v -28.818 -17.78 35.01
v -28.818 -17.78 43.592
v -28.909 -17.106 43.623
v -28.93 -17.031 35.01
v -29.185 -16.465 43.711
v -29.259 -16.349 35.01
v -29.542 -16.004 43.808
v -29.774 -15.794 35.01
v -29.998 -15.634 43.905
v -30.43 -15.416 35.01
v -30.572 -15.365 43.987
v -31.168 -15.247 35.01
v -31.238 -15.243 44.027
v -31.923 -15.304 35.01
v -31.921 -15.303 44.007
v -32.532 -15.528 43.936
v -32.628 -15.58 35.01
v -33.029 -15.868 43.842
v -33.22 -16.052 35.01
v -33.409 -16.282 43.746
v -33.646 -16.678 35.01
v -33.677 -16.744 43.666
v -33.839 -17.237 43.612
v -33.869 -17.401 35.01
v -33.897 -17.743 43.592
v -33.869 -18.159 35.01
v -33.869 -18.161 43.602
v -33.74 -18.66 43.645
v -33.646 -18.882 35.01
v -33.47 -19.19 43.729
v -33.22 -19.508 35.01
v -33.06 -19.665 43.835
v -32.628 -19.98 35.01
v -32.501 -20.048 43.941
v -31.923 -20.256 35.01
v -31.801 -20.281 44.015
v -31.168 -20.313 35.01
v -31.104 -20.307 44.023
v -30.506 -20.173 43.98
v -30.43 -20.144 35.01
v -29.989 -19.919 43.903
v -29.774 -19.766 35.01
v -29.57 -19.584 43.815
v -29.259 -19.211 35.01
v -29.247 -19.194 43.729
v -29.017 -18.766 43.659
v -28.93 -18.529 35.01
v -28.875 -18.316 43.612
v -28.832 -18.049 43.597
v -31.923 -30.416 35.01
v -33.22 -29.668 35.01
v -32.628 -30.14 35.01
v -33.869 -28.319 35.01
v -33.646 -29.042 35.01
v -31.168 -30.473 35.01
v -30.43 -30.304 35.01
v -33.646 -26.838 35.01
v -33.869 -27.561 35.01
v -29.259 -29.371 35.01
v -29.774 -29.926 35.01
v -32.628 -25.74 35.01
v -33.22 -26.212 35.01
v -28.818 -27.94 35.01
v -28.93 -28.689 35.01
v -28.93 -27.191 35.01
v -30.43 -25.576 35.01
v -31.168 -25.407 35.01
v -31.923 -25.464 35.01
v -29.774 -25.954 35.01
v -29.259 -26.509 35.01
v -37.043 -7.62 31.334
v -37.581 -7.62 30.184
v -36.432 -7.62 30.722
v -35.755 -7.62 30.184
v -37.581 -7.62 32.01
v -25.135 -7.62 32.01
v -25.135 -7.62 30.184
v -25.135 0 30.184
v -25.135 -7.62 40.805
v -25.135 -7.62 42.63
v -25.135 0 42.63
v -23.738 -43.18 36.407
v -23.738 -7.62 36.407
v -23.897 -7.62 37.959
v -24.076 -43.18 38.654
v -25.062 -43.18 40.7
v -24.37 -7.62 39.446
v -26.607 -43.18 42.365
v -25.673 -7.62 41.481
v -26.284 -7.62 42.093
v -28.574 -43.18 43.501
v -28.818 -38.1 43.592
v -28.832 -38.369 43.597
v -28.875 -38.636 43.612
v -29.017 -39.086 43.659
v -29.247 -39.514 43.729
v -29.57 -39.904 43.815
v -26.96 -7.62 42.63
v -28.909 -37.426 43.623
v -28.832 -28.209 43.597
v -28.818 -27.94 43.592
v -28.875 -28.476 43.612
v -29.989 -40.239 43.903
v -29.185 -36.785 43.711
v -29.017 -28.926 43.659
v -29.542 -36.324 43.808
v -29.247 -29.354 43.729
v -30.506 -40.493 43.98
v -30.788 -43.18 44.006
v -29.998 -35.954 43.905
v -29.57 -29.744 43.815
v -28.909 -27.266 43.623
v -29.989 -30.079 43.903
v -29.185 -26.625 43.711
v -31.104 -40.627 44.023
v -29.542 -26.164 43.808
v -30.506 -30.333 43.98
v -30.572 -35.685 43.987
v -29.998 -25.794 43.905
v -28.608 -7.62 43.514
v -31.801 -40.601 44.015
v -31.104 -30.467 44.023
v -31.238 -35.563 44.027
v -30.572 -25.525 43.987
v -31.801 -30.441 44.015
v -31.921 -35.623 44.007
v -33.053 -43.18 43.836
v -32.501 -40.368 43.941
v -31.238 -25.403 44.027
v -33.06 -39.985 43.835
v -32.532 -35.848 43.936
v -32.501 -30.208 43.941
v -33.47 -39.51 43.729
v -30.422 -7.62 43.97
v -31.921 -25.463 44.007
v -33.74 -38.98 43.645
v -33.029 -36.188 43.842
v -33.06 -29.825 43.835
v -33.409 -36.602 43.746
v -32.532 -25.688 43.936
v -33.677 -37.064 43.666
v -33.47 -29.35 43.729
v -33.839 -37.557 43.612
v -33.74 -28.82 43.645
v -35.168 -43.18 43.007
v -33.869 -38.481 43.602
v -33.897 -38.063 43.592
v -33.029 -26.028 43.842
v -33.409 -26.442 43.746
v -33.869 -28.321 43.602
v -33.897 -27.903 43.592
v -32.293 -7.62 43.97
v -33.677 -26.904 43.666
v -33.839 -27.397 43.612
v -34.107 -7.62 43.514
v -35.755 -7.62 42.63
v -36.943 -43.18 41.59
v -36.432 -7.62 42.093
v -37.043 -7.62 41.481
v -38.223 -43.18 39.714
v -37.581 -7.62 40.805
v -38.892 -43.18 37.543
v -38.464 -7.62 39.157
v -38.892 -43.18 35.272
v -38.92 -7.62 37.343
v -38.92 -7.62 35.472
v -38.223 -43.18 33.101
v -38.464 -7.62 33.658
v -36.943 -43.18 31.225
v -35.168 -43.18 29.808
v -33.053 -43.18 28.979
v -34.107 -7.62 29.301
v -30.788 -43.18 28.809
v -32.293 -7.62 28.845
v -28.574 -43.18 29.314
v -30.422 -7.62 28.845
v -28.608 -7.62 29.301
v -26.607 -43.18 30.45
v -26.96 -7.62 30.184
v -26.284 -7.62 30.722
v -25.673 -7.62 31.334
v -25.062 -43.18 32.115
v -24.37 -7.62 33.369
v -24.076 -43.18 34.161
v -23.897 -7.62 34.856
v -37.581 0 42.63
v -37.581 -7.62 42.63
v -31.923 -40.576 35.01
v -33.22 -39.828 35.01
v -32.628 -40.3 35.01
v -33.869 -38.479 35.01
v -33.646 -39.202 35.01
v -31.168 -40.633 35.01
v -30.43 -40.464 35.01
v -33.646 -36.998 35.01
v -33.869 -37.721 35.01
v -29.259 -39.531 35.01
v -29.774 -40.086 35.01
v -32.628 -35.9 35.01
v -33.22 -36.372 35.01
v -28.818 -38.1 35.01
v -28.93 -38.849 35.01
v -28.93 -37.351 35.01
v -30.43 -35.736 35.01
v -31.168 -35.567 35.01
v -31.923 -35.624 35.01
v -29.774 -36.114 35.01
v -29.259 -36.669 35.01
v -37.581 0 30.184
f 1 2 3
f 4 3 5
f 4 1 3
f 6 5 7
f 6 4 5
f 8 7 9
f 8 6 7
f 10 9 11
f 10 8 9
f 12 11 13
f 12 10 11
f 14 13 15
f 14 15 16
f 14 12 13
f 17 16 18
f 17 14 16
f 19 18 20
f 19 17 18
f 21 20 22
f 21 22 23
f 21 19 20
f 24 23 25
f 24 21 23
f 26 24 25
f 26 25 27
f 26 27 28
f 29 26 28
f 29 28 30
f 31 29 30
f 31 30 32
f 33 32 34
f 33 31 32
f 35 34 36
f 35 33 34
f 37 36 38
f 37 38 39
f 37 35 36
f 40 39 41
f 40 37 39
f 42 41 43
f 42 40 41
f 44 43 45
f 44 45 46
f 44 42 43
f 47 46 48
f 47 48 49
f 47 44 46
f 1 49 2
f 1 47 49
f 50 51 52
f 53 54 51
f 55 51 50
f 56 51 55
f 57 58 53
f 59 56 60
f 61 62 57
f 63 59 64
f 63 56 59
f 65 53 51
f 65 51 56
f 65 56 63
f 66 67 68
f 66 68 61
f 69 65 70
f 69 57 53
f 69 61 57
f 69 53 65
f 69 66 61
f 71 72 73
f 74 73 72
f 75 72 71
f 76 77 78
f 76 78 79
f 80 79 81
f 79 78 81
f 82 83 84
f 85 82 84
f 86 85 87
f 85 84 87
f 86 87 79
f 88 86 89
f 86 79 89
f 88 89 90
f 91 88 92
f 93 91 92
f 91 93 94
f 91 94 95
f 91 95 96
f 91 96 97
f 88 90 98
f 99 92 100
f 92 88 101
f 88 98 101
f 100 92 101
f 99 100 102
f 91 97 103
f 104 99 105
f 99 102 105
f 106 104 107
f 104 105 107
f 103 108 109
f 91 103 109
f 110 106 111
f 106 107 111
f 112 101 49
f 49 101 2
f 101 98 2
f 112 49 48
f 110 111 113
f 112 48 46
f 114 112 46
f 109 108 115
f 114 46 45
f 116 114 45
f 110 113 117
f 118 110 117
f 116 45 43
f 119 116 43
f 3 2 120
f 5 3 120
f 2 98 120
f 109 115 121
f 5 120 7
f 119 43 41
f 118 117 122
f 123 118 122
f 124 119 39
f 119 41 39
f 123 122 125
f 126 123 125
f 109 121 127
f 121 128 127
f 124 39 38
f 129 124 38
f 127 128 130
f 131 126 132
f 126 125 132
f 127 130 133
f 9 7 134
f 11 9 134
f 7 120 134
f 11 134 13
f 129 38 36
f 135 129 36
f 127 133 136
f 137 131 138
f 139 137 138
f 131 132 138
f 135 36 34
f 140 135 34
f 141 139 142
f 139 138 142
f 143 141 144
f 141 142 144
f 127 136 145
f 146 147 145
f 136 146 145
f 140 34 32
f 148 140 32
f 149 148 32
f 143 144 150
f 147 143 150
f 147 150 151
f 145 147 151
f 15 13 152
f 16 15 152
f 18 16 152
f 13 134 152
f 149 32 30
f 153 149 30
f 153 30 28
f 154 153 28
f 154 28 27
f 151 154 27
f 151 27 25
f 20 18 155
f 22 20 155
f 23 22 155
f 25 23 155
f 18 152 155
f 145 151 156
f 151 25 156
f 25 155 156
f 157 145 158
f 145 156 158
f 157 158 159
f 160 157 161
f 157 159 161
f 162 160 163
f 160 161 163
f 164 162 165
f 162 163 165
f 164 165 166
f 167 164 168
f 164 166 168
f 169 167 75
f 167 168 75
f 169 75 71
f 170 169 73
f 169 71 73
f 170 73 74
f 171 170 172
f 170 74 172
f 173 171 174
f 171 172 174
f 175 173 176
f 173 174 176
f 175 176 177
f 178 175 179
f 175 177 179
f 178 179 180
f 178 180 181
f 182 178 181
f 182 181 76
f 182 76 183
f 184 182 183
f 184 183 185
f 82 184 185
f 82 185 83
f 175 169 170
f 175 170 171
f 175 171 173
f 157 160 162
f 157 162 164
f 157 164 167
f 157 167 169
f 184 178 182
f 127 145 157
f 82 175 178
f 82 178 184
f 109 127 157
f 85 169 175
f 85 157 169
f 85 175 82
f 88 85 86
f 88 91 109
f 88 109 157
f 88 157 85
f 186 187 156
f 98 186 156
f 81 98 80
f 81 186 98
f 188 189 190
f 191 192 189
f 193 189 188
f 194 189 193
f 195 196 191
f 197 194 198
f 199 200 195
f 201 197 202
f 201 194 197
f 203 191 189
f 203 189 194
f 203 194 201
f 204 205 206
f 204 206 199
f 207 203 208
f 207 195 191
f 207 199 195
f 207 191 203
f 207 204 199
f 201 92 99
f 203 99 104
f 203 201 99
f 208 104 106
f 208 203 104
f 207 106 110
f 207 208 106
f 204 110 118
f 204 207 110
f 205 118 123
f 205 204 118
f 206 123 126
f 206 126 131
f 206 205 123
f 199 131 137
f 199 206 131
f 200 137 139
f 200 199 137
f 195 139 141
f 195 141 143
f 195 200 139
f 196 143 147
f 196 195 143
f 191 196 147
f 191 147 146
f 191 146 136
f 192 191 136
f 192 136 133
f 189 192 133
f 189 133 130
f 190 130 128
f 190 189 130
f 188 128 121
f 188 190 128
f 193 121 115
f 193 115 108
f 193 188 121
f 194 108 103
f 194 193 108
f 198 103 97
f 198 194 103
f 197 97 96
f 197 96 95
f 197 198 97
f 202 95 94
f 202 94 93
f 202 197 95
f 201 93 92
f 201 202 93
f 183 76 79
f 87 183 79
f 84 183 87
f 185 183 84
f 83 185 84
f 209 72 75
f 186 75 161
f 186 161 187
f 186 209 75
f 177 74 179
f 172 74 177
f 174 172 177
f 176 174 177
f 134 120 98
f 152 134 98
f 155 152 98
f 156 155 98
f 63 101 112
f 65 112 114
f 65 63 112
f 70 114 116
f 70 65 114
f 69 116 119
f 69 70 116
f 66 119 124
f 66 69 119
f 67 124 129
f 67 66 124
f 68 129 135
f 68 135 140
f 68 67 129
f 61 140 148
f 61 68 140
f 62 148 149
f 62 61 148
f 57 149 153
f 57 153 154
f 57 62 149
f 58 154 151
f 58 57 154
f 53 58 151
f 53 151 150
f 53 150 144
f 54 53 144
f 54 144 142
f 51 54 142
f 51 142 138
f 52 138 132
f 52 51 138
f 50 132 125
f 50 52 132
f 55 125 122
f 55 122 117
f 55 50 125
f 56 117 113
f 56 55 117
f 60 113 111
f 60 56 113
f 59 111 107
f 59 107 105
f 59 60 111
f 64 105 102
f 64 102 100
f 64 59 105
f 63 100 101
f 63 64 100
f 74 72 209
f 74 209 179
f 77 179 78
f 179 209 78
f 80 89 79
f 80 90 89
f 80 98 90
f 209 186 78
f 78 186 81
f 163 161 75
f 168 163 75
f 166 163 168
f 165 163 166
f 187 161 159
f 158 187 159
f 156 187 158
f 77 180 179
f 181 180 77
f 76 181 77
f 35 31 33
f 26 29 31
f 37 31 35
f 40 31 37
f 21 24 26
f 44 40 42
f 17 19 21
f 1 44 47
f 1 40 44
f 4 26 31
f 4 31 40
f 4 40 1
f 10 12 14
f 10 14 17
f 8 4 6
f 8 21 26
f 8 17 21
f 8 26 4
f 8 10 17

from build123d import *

# Parameters (mm, degrees)
F0_W          = 12.446
F0_H          = 12.446
F1_DEPTH      = 7.62
F2_R          = 7.62
F3_DEPTH      = 35.56
F4_R          = 2.54
F5_DEPTH      = 7.62
F5_DEPTH_BACK = 25.4


with BuildPart() as f1:
    # F0 (on Front) → F1 (new body)
    with BuildSketch(Plane.XZ):
        with Locations((-31.3575975597, 36.4074829547)):
            Rectangle(F0_W, F0_H)
    extrude(amount=F1_DEPTH)

    # F2 (on face) → F3 (join)
    with BuildSketch(Plane.XZ.offset(7.62)):
        with Locations((-31.3575975597, 36.4074829547)):
            Circle(F2_R)
    extrude(amount=F3_DEPTH)

    # F4 (on face) → F5 (cut, two sides)
    with BuildSketch(Plane.XY.offset(42.6304829547)) as f5_sk:
        with Locations((-31.3575975597, -17.78)):
            Circle(F4_R)
        with Locations((-31.3575975597, -27.94)):
            Circle(F4_R)
        with Locations((-31.3575975597, -38.1)):
            Circle(F4_R)
    extrude(amount=-F5_DEPTH, mode=Mode.SUBTRACT)
    extrude(f5_sk.sketch, amount=F5_DEPTH_BACK, mode=Mode.SUBTRACT)


solid = f1.part
